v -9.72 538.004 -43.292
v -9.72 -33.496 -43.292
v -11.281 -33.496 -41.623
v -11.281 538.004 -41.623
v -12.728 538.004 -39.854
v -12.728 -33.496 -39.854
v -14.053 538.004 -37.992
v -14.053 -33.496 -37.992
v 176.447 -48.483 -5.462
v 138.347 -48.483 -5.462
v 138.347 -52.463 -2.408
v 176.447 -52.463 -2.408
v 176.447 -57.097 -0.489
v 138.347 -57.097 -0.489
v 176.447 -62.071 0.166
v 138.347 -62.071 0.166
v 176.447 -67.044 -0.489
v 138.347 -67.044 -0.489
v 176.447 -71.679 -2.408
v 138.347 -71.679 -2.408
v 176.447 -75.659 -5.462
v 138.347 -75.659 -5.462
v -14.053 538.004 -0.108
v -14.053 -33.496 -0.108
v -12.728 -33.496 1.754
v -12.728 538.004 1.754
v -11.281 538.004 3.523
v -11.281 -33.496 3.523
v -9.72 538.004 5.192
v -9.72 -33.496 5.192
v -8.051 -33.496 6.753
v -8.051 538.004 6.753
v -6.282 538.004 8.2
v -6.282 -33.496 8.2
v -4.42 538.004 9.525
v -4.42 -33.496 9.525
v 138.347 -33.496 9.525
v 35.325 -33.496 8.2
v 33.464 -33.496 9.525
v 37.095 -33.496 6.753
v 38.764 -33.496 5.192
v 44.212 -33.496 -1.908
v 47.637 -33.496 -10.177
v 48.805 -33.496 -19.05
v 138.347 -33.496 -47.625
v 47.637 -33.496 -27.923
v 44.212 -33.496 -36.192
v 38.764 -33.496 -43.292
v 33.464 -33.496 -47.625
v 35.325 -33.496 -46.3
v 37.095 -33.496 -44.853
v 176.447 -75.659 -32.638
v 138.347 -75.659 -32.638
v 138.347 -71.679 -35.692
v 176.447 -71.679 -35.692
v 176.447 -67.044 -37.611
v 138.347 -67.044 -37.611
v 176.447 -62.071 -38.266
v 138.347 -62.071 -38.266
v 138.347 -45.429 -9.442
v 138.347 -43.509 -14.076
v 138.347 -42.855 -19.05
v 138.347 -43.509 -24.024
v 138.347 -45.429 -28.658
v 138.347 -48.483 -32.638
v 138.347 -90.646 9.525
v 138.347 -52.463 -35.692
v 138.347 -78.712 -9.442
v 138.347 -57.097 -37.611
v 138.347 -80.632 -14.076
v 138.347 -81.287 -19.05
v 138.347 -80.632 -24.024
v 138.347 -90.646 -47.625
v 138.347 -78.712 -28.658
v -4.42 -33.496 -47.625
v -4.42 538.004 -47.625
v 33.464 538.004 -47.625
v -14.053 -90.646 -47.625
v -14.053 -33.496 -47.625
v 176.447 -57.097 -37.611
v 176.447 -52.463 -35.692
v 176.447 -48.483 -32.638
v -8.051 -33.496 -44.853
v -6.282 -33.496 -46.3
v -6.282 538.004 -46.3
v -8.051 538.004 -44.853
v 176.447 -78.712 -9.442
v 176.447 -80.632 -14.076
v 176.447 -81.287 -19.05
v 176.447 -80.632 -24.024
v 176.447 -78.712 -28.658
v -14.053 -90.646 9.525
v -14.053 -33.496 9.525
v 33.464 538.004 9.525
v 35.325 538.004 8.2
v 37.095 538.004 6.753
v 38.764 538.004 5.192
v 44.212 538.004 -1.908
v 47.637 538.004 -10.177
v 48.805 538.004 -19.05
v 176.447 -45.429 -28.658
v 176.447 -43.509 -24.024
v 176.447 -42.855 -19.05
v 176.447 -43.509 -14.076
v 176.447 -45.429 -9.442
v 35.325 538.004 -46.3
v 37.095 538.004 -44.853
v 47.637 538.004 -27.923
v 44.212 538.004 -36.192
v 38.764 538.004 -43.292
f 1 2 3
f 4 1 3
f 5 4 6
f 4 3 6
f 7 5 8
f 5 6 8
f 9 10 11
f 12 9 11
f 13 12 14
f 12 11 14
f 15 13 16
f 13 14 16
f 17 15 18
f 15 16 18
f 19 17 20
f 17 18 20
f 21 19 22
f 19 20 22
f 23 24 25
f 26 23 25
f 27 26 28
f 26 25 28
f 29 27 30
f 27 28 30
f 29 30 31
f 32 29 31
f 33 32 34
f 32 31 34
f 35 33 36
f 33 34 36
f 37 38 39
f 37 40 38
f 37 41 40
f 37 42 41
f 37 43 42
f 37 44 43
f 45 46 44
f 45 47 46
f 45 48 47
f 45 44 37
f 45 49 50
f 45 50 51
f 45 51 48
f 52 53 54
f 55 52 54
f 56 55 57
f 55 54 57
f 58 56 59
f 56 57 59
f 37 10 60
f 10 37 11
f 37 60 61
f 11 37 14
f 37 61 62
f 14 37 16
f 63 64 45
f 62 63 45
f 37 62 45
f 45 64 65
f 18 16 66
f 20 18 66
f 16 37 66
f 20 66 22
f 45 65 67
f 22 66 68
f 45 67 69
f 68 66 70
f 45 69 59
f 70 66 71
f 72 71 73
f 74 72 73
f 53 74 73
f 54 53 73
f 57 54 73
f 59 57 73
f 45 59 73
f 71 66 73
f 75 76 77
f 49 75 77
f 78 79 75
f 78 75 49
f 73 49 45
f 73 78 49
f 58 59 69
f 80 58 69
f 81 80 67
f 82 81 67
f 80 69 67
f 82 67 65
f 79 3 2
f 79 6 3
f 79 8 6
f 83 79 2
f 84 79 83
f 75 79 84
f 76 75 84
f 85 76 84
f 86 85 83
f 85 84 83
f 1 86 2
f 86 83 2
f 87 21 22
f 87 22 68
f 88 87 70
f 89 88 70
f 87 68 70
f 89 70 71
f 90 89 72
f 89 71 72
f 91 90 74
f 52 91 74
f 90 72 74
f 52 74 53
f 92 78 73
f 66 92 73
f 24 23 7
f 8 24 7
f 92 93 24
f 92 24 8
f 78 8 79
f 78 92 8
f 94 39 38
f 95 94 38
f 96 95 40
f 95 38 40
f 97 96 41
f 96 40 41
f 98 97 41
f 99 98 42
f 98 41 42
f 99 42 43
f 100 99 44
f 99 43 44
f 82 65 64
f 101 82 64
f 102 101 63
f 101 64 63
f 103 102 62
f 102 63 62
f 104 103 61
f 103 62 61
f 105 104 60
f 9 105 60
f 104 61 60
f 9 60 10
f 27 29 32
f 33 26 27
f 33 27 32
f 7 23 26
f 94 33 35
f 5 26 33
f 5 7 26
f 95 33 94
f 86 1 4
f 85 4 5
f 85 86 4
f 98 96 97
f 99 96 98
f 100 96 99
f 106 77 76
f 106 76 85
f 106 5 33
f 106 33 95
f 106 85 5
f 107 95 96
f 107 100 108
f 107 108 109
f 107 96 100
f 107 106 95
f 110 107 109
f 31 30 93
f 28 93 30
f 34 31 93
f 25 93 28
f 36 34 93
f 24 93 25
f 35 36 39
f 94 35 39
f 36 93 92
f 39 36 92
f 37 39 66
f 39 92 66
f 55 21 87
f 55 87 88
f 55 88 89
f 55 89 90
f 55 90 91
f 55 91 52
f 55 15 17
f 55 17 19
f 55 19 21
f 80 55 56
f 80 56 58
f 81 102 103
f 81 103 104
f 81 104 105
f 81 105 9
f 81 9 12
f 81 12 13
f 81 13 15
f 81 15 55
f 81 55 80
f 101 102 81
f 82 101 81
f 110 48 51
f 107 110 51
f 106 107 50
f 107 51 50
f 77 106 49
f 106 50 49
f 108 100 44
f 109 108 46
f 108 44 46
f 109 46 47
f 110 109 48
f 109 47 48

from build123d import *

# Parameters (mm, degrees)
SKETCH1_W           = 101.6
SKETCH1_H           = 38.1
BOSS_EXTRUDE1_DEPTH = 38.1
BOSS_EXTRUDE2_DEPTH = 25.4
BOSS_EXTRUDE3_DEPTH = 381
SCALE1_SCALE        = 1.5


with BuildPart() as part:
    # Sketch1 → Boss-Extrude1 (new body)
    with BuildSketch(Plane(origin=(0, 0, 0), x_dir=(1, 0, 0), z_dir=(0, 1, 0))):
        with Locations((50.8, 19.05)):
            Rectangle(SKETCH1_W, SKETCH1_H)
    extrude(amount=BOSS_EXTRUDE1_DEPTH)

    # Sketch2 → Boss-Extrude2 (add)
    with BuildSketch(Plane(origin=(101.6, 0, 0), x_dir=(0, 0, -1), z_dir=(1, 0, 0))):
        with BuildLine():
            ThreePointArc((28.108587284, 28.108587284), (19.05, 31.860776993), (9.991412716, 28.108587284))
            Line((9.991412716, 28.108587284), (19.05, 19.05))
            Line((19.05, 19.05), (28.108587284, 28.108587284))
        make_face()
        with BuildLine():
            Line((19.05, 19.05), (9.991412716, 28.108587284))
            ThreePointArc((9.991412716, 28.108587284), (6.239223007, 19.05), (9.991412716, 9.991412716))
            Line((9.991412716, 9.991412716), (19.05, 19.05))
        make_face()
        with BuildLine():
            Line((28.108587284, 28.108587284), (19.05, 19.05))
            Line((19.05, 19.05), (28.108587284, 9.991412716))
            ThreePointArc((28.108587284, 9.991412716), (30.885614659, 14.147527889), (31.860776993, 19.05))
            ThreePointArc((31.860776993, 19.05), (30.885614659, 23.952472111), (28.108587284, 28.108587284))
        make_face()
        with BuildLine():
            Line((28.108587284, 9.991412716), (19.05, 19.05))
            Line((19.05, 19.05), (9.991412716, 9.991412716))
            ThreePointArc((9.991412716, 9.991412716), (19.05, 6.239223007), (28.108587284, 9.991412716))
        make_face()
    extrude(amount=BOSS_EXTRUDE2_DEPTH)

    # Sketch3 → Boss-Extrude3 (add)
    with BuildSketch(Plane(origin=(0, 38.1, 0), x_dir=(1, 0, 0), z_dir=(0, 1, 0))):
        with BuildLine():
            Line((33.415123016, 4.684876984), (19.05, 19.05))
            Line((19.05, 19.05), (4.684876984, 4.684876984))
            ThreePointArc((4.684876984, 4.684876984), (8.08545393, 1.947595257), (11.992307848, 0))
            Line((11.992307848, 0), (26.107692152, 0))
            ThreePointArc((26.107692152, 0), (30.01454607, 1.947595257), (33.415123016, 4.684876984))
        make_face()
        with BuildLine():
            Line((33.415123016, 33.415123016), (19.05, 19.05))
            Line((19.05, 19.05), (33.415123016, 4.684876984))
            ThreePointArc((33.415123016, 4.684876984), (37.818937718, 11.275651446), (39.365351794, 19.05))
            ThreePointArc((39.365351794, 19.05), (37.818937718, 26.824348554), (33.415123016, 33.415123016))
        make_face()
        with BuildLine():
            ThreePointArc((11.992307848, 38.1), (8.08545393, 36.152404743), (4.684876984, 33.415123016))
            Line((4.684876984, 33.415123016), (19.05, 19.05))
            Line((19.05, 19.05), (33.415123016, 33.415123016))
            ThreePointArc((33.415123016, 33.415123016), (30.01454607, 36.152404743), (26.107692152, 38.1))
            Line((26.107692152, 38.1), (11.992307848, 38.1))
        make_face()
        with BuildLine():
            Line((19.05, 19.05), (4.684876984, 33.415123016))
            ThreePointArc((4.684876984, 33.415123016), (1.947595257, 30.01454607), (0, 26.107692152))
            Line((0, 26.107692152), (0, 11.992307848))
            ThreePointArc((0, 11.992307848), (1.947595257, 8.08545393), (4.684876984, 4.684876984))
            Line((4.684876984, 4.684876984), (19.05, 19.05))
        make_face()
        with BuildLine():
            ThreePointArc((35.21117424, 35.21117424), (33.516839784, 36.74400046), (31.677929586, 38.1))
            Line((31.677929586, 38.1), (26.107692152, 38.1))
            ThreePointArc((26.107692152, 38.1), (30.01454607, 36.152404743), (33.415123016, 33.415123016))
            Line((33.415123016, 33.415123016), (35.21117424, 35.21117424))
        make_face()
        with BuildLine():
            ThreePointArc((41.905351794, 19.05), (40.165591731, 27.796364472), (35.21117424, 35.21117424))
            Line((35.21117424, 35.21117424), (33.415123016, 33.415123016))
            ThreePointArc((33.415123016, 33.415123016), (37.818937718, 26.824348554), (39.365351794, 19.05))
            ThreePointArc((39.365351794, 19.05), (37.818937718, 11.275651446), (33.415123016, 4.684876984))
            Line((33.415123016, 4.684876984), (35.21117424, 2.88882576))
            ThreePointArc((35.21117424, 2.88882576), (40.165591731, 10.303635528), (41.905351794, 19.05))
        make_face()
        with BuildLine():
            Line((35.21117424, 2.88882576), (33.415123016, 4.684876984))
            ThreePointArc((33.415123016, 4.684876984), (30.01454607, 1.947595257), (26.107692152, 0))
            Line((26.107692152, 0), (31.677929586, 0))
            ThreePointArc((31.677929586, 0), (33.516839784, 1.35599954), (35.21117424, 2.88882576))
        make_face()
        with BuildLine():
            Line((4.684876984, 4.684876984), (2.88882576, 2.88882576))
            ThreePointArc((2.88882576, 2.88882576), (4.583160216, 1.35599954), (6.422070414, 0))
            Line((6.422070414, 0), (11.992307848, 0))
            ThreePointArc((11.992307848, 0), (8.08545393, 1.947595257), (4.684876984, 4.684876984))
        make_face()
        with BuildLine():
            Line((0, 11.992307848), (0, 6.422070414))
            ThreePointArc((0, 6.422070414), (1.35599954, 4.583160216), (2.88882576, 2.88882576))
            Line((2.88882576, 2.88882576), (4.684876984, 4.684876984))
            ThreePointArc((4.684876984, 4.684876984), (1.947595257, 8.08545393), (0, 11.992307848))
        make_face()
        with BuildLine():
            ThreePointArc((6.422070414, 38.1), (4.583160216, 36.74400046), (2.88882576, 35.21117424))
            Line((2.88882576, 35.21117424), (4.684876984, 33.415123016))
            ThreePointArc((4.684876984, 33.415123016), (8.08545393, 36.152404743), (11.992307848, 38.1))
            Line((11.992307848, 38.1), (6.422070414, 38.1))
        make_face()
        with BuildLine():
            Line((4.684876984, 33.415123016), (2.88882576, 35.21117424))
            ThreePointArc((2.88882576, 35.21117424), (1.35599954, 33.516839784), (0, 31.677929586))
            Line((0, 31.677929586), (0, 26.107692152))
            ThreePointArc((0, 26.107692152), (1.947595257, 30.01454607), (4.684876984, 33.415123016))
        make_face()
    extrude(amount=BOSS_EXTRUDE3_DEPTH)


with BuildPart() as part_1:
    # Scale1: scaled about (28.106189099, 181.291595576, -19.05)
    add(part.part.scale(SCALE1_SCALE).moved(Location((-14.05309455, -90.645797788, 9.525))))


solid = part_1.part
